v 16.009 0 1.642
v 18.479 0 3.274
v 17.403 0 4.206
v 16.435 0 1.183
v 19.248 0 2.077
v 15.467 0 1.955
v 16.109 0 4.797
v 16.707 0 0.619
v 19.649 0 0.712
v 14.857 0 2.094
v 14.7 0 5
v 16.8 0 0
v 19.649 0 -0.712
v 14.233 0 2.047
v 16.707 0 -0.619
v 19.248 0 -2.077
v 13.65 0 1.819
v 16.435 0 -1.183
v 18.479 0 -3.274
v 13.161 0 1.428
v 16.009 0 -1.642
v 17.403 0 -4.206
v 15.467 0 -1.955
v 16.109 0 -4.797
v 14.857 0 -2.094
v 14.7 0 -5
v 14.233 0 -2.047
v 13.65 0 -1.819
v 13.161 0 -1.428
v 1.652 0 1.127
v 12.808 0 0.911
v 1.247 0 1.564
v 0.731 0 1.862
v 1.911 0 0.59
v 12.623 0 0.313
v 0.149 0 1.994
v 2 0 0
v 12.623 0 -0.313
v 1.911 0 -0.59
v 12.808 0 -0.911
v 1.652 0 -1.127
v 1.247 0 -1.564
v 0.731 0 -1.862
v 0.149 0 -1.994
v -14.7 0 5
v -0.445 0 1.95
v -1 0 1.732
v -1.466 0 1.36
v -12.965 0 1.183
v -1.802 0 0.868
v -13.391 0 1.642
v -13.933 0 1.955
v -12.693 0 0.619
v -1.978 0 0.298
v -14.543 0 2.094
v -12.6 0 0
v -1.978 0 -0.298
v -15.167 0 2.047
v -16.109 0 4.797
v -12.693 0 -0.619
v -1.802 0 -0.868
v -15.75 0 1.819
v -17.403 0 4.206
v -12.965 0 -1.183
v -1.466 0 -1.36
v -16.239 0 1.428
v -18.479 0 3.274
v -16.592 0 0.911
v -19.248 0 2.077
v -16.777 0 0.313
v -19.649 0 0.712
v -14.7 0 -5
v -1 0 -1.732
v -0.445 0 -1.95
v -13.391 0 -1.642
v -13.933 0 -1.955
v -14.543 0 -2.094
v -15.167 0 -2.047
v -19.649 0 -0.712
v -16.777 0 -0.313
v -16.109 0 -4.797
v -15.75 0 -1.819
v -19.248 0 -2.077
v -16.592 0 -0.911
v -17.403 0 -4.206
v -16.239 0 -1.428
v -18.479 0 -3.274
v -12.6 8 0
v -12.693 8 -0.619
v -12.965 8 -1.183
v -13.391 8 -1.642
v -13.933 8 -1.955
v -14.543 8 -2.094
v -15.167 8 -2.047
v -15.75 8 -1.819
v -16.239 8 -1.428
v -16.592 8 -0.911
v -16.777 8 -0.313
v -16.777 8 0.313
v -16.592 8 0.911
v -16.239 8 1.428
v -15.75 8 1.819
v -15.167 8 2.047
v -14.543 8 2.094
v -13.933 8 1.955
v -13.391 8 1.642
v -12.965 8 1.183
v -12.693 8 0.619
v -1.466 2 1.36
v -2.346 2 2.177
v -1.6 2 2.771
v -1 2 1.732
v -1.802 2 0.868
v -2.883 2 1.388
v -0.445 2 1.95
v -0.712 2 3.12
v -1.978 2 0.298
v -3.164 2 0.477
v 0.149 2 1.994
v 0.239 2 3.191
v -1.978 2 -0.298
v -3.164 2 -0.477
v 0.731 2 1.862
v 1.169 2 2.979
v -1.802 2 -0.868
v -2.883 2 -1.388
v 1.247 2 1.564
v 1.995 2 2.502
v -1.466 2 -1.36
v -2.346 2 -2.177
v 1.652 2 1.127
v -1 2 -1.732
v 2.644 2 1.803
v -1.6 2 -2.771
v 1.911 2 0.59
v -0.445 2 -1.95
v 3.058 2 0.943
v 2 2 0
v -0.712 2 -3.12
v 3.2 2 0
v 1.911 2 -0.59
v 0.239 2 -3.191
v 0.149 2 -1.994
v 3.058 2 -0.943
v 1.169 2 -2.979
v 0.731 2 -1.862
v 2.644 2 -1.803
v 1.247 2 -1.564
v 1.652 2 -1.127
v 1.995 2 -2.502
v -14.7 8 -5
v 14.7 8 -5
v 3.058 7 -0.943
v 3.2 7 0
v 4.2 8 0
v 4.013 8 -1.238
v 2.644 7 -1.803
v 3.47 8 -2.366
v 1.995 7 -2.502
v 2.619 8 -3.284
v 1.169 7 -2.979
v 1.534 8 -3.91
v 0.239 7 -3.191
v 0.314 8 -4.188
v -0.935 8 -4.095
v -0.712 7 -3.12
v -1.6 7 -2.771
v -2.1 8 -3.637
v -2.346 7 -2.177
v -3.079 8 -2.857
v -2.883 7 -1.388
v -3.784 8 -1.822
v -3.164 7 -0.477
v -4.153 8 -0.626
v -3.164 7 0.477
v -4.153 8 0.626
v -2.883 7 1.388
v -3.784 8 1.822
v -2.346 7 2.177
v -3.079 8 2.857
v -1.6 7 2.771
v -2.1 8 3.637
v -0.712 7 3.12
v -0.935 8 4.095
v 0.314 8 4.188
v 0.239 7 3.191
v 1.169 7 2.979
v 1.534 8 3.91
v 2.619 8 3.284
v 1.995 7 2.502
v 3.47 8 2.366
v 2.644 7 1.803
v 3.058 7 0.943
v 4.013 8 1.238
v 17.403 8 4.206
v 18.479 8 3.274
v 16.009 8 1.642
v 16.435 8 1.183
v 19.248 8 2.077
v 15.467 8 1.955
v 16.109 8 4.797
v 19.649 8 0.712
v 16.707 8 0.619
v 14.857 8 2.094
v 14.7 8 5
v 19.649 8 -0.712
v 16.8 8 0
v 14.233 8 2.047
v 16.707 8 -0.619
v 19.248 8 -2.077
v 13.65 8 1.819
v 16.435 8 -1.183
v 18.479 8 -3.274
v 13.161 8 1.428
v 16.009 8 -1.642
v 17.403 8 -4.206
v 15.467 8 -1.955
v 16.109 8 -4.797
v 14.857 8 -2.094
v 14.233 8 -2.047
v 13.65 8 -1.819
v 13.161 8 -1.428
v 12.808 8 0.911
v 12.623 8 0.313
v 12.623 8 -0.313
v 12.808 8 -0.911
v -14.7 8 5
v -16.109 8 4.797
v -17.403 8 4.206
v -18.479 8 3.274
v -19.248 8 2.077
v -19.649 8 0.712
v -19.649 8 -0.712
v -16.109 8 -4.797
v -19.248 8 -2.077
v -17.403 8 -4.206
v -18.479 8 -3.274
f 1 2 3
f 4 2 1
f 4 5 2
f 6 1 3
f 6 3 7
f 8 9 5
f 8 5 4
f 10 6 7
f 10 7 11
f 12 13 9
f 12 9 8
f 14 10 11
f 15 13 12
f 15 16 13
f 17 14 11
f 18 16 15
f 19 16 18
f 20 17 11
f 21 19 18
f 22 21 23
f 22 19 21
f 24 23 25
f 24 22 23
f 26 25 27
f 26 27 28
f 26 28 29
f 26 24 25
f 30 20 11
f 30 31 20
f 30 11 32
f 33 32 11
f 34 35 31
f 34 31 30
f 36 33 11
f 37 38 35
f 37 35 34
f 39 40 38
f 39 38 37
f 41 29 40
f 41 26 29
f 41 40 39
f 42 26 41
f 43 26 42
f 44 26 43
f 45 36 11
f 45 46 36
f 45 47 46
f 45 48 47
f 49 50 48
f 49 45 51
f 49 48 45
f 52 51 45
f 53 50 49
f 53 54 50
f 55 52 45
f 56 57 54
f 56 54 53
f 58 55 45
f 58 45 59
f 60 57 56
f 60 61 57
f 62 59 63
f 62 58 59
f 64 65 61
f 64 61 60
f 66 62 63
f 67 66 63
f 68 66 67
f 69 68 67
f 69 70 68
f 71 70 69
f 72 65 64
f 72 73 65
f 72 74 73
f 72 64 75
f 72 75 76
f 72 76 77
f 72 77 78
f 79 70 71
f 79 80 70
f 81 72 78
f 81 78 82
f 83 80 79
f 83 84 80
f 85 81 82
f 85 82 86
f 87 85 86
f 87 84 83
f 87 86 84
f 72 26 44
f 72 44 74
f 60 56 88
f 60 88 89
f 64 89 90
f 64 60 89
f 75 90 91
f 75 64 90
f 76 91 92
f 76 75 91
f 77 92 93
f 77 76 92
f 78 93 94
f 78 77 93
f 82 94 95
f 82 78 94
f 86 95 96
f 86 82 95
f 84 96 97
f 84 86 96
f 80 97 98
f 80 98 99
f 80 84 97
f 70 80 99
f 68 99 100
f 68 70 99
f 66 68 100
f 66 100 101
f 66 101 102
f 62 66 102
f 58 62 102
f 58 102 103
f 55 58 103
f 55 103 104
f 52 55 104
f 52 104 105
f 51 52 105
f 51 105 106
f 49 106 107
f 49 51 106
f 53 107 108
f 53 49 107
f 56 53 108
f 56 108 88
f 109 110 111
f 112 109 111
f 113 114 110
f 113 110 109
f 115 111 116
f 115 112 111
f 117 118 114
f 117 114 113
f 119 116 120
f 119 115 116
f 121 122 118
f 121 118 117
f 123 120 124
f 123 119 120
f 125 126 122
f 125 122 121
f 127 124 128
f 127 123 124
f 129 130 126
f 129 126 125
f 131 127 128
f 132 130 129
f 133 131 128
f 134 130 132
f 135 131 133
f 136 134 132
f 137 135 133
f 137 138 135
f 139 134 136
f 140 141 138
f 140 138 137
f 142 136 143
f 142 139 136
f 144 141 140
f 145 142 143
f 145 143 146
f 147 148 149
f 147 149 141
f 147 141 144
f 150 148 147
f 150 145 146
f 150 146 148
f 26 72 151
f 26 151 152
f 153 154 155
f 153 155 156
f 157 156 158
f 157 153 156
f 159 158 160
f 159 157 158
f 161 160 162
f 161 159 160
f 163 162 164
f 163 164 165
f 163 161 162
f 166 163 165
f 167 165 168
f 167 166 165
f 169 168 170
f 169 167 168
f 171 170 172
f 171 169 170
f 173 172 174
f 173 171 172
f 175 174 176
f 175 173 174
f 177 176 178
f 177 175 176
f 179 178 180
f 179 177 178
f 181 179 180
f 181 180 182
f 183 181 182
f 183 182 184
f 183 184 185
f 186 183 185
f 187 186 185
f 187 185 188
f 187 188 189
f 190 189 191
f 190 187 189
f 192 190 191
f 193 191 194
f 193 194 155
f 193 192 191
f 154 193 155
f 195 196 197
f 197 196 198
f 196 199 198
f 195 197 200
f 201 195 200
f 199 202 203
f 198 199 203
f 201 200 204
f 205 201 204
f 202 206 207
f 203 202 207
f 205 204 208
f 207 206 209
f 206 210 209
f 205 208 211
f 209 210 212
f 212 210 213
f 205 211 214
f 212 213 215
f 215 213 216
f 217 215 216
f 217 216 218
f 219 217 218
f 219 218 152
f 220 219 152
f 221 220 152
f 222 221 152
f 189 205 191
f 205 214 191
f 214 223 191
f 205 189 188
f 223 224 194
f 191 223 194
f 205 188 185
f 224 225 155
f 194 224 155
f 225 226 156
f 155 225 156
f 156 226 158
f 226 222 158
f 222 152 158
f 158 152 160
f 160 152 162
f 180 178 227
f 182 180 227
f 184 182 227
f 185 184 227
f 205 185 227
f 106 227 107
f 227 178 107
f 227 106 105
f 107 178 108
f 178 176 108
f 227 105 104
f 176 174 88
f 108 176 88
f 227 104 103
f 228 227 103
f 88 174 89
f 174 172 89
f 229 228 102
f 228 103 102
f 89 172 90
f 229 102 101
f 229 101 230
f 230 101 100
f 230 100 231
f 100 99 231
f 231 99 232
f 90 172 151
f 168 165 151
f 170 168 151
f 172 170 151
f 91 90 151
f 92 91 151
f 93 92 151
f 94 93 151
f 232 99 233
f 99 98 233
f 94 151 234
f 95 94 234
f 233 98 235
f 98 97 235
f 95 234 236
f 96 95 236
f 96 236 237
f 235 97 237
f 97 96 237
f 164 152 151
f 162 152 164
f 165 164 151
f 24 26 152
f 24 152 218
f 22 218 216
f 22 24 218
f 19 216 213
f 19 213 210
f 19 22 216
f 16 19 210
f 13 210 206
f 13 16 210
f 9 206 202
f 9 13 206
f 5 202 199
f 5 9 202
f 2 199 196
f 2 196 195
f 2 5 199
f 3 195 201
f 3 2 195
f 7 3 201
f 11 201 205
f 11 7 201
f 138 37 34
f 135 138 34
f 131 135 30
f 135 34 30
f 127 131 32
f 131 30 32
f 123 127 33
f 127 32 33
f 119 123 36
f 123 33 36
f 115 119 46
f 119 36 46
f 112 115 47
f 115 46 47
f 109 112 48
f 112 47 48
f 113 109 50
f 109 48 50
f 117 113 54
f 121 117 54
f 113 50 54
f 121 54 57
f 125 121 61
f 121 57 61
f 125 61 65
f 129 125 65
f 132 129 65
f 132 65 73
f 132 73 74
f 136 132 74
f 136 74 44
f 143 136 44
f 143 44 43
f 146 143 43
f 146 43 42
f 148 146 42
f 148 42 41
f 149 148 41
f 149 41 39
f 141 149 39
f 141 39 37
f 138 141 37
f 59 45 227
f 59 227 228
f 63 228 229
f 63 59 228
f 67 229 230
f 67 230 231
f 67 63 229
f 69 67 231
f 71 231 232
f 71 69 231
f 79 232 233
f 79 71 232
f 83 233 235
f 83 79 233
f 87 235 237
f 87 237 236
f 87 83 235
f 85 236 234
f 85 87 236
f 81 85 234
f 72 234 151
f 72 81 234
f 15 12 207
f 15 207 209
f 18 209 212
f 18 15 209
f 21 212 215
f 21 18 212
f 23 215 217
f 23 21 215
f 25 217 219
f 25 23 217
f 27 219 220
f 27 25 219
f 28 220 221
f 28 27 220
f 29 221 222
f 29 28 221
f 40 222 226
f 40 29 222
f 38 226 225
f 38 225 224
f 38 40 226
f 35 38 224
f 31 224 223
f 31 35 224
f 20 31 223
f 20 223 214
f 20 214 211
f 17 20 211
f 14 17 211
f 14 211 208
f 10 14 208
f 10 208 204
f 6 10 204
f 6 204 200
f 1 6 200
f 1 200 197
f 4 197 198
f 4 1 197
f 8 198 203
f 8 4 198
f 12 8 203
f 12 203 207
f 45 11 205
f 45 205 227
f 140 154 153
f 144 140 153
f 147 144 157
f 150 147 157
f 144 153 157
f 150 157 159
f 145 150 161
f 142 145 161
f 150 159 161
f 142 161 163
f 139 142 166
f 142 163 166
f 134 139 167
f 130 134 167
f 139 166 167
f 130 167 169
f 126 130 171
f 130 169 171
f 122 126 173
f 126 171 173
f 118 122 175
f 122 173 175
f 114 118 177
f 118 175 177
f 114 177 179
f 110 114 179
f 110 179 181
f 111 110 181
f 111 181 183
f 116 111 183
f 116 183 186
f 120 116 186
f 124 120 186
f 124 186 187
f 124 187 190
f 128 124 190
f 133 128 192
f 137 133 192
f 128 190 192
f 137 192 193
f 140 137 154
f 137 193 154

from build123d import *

# Parameters (mm, degrees)
SKETCH1_R           = 2.1
BOSS_EXTRUDE1_DEPTH = 8
SKETCH2_R           = 3.2
CUT_EXTRUDE1_DEPTH  = 6
SKETCH3_R           = 2
CUT_EXTRUDE2_DEPTH  = 6
CHAMFER1_SIZE       = 1


with BuildPart() as part:
    # Sketch1 → Boss-Extrude1 (new body)
    with BuildSketch(Plane(origin=(0, 0, 0), x_dir=(1, 0, 0), z_dir=(0, 1, 0))):
        with BuildLine():
            Line((-14.7, 5), (14.7, 5))
            ThreePointArc((14.7, 5), (19.7, 0), (14.7, -5))
            Line((14.7, -5), (-14.7, -5))
            ThreePointArc((-14.7, -5), (-19.7, 0), (-14.7, 5))
        make_face()
        with Locations((-14.7, 0)):
            Circle(SKETCH1_R, mode=Mode.SUBTRACT)
        with Locations((14.7, 0)):
            Circle(SKETCH1_R, mode=Mode.SUBTRACT)
    extrude(amount=BOSS_EXTRUDE1_DEPTH)

    # Sketch2 → Cut-Extrude1 (cut)
    with BuildSketch(Plane(origin=(0, 8, 0), x_dir=(1, 0, 0), z_dir=(0, 1, 0))):
        Circle(SKETCH2_R)
    extrude(amount=-CUT_EXTRUDE1_DEPTH, mode=Mode.SUBTRACT)

    # Sketch3 → Cut-Extrude2 (cut)
    with BuildSketch(Plane.XZ):
        Circle(SKETCH3_R)
    extrude(amount=-CUT_EXTRUDE2_DEPTH, mode=Mode.SUBTRACT)

    # Chamfer1
    chamfer1_edges = [part.edges().sort_by_distance(p)[0] for p in [
        (-3.2, 8, 0),
    ]]
    chamfer(chamfer1_edges, length=CHAMFER1_SIZE)


solid = part.part
